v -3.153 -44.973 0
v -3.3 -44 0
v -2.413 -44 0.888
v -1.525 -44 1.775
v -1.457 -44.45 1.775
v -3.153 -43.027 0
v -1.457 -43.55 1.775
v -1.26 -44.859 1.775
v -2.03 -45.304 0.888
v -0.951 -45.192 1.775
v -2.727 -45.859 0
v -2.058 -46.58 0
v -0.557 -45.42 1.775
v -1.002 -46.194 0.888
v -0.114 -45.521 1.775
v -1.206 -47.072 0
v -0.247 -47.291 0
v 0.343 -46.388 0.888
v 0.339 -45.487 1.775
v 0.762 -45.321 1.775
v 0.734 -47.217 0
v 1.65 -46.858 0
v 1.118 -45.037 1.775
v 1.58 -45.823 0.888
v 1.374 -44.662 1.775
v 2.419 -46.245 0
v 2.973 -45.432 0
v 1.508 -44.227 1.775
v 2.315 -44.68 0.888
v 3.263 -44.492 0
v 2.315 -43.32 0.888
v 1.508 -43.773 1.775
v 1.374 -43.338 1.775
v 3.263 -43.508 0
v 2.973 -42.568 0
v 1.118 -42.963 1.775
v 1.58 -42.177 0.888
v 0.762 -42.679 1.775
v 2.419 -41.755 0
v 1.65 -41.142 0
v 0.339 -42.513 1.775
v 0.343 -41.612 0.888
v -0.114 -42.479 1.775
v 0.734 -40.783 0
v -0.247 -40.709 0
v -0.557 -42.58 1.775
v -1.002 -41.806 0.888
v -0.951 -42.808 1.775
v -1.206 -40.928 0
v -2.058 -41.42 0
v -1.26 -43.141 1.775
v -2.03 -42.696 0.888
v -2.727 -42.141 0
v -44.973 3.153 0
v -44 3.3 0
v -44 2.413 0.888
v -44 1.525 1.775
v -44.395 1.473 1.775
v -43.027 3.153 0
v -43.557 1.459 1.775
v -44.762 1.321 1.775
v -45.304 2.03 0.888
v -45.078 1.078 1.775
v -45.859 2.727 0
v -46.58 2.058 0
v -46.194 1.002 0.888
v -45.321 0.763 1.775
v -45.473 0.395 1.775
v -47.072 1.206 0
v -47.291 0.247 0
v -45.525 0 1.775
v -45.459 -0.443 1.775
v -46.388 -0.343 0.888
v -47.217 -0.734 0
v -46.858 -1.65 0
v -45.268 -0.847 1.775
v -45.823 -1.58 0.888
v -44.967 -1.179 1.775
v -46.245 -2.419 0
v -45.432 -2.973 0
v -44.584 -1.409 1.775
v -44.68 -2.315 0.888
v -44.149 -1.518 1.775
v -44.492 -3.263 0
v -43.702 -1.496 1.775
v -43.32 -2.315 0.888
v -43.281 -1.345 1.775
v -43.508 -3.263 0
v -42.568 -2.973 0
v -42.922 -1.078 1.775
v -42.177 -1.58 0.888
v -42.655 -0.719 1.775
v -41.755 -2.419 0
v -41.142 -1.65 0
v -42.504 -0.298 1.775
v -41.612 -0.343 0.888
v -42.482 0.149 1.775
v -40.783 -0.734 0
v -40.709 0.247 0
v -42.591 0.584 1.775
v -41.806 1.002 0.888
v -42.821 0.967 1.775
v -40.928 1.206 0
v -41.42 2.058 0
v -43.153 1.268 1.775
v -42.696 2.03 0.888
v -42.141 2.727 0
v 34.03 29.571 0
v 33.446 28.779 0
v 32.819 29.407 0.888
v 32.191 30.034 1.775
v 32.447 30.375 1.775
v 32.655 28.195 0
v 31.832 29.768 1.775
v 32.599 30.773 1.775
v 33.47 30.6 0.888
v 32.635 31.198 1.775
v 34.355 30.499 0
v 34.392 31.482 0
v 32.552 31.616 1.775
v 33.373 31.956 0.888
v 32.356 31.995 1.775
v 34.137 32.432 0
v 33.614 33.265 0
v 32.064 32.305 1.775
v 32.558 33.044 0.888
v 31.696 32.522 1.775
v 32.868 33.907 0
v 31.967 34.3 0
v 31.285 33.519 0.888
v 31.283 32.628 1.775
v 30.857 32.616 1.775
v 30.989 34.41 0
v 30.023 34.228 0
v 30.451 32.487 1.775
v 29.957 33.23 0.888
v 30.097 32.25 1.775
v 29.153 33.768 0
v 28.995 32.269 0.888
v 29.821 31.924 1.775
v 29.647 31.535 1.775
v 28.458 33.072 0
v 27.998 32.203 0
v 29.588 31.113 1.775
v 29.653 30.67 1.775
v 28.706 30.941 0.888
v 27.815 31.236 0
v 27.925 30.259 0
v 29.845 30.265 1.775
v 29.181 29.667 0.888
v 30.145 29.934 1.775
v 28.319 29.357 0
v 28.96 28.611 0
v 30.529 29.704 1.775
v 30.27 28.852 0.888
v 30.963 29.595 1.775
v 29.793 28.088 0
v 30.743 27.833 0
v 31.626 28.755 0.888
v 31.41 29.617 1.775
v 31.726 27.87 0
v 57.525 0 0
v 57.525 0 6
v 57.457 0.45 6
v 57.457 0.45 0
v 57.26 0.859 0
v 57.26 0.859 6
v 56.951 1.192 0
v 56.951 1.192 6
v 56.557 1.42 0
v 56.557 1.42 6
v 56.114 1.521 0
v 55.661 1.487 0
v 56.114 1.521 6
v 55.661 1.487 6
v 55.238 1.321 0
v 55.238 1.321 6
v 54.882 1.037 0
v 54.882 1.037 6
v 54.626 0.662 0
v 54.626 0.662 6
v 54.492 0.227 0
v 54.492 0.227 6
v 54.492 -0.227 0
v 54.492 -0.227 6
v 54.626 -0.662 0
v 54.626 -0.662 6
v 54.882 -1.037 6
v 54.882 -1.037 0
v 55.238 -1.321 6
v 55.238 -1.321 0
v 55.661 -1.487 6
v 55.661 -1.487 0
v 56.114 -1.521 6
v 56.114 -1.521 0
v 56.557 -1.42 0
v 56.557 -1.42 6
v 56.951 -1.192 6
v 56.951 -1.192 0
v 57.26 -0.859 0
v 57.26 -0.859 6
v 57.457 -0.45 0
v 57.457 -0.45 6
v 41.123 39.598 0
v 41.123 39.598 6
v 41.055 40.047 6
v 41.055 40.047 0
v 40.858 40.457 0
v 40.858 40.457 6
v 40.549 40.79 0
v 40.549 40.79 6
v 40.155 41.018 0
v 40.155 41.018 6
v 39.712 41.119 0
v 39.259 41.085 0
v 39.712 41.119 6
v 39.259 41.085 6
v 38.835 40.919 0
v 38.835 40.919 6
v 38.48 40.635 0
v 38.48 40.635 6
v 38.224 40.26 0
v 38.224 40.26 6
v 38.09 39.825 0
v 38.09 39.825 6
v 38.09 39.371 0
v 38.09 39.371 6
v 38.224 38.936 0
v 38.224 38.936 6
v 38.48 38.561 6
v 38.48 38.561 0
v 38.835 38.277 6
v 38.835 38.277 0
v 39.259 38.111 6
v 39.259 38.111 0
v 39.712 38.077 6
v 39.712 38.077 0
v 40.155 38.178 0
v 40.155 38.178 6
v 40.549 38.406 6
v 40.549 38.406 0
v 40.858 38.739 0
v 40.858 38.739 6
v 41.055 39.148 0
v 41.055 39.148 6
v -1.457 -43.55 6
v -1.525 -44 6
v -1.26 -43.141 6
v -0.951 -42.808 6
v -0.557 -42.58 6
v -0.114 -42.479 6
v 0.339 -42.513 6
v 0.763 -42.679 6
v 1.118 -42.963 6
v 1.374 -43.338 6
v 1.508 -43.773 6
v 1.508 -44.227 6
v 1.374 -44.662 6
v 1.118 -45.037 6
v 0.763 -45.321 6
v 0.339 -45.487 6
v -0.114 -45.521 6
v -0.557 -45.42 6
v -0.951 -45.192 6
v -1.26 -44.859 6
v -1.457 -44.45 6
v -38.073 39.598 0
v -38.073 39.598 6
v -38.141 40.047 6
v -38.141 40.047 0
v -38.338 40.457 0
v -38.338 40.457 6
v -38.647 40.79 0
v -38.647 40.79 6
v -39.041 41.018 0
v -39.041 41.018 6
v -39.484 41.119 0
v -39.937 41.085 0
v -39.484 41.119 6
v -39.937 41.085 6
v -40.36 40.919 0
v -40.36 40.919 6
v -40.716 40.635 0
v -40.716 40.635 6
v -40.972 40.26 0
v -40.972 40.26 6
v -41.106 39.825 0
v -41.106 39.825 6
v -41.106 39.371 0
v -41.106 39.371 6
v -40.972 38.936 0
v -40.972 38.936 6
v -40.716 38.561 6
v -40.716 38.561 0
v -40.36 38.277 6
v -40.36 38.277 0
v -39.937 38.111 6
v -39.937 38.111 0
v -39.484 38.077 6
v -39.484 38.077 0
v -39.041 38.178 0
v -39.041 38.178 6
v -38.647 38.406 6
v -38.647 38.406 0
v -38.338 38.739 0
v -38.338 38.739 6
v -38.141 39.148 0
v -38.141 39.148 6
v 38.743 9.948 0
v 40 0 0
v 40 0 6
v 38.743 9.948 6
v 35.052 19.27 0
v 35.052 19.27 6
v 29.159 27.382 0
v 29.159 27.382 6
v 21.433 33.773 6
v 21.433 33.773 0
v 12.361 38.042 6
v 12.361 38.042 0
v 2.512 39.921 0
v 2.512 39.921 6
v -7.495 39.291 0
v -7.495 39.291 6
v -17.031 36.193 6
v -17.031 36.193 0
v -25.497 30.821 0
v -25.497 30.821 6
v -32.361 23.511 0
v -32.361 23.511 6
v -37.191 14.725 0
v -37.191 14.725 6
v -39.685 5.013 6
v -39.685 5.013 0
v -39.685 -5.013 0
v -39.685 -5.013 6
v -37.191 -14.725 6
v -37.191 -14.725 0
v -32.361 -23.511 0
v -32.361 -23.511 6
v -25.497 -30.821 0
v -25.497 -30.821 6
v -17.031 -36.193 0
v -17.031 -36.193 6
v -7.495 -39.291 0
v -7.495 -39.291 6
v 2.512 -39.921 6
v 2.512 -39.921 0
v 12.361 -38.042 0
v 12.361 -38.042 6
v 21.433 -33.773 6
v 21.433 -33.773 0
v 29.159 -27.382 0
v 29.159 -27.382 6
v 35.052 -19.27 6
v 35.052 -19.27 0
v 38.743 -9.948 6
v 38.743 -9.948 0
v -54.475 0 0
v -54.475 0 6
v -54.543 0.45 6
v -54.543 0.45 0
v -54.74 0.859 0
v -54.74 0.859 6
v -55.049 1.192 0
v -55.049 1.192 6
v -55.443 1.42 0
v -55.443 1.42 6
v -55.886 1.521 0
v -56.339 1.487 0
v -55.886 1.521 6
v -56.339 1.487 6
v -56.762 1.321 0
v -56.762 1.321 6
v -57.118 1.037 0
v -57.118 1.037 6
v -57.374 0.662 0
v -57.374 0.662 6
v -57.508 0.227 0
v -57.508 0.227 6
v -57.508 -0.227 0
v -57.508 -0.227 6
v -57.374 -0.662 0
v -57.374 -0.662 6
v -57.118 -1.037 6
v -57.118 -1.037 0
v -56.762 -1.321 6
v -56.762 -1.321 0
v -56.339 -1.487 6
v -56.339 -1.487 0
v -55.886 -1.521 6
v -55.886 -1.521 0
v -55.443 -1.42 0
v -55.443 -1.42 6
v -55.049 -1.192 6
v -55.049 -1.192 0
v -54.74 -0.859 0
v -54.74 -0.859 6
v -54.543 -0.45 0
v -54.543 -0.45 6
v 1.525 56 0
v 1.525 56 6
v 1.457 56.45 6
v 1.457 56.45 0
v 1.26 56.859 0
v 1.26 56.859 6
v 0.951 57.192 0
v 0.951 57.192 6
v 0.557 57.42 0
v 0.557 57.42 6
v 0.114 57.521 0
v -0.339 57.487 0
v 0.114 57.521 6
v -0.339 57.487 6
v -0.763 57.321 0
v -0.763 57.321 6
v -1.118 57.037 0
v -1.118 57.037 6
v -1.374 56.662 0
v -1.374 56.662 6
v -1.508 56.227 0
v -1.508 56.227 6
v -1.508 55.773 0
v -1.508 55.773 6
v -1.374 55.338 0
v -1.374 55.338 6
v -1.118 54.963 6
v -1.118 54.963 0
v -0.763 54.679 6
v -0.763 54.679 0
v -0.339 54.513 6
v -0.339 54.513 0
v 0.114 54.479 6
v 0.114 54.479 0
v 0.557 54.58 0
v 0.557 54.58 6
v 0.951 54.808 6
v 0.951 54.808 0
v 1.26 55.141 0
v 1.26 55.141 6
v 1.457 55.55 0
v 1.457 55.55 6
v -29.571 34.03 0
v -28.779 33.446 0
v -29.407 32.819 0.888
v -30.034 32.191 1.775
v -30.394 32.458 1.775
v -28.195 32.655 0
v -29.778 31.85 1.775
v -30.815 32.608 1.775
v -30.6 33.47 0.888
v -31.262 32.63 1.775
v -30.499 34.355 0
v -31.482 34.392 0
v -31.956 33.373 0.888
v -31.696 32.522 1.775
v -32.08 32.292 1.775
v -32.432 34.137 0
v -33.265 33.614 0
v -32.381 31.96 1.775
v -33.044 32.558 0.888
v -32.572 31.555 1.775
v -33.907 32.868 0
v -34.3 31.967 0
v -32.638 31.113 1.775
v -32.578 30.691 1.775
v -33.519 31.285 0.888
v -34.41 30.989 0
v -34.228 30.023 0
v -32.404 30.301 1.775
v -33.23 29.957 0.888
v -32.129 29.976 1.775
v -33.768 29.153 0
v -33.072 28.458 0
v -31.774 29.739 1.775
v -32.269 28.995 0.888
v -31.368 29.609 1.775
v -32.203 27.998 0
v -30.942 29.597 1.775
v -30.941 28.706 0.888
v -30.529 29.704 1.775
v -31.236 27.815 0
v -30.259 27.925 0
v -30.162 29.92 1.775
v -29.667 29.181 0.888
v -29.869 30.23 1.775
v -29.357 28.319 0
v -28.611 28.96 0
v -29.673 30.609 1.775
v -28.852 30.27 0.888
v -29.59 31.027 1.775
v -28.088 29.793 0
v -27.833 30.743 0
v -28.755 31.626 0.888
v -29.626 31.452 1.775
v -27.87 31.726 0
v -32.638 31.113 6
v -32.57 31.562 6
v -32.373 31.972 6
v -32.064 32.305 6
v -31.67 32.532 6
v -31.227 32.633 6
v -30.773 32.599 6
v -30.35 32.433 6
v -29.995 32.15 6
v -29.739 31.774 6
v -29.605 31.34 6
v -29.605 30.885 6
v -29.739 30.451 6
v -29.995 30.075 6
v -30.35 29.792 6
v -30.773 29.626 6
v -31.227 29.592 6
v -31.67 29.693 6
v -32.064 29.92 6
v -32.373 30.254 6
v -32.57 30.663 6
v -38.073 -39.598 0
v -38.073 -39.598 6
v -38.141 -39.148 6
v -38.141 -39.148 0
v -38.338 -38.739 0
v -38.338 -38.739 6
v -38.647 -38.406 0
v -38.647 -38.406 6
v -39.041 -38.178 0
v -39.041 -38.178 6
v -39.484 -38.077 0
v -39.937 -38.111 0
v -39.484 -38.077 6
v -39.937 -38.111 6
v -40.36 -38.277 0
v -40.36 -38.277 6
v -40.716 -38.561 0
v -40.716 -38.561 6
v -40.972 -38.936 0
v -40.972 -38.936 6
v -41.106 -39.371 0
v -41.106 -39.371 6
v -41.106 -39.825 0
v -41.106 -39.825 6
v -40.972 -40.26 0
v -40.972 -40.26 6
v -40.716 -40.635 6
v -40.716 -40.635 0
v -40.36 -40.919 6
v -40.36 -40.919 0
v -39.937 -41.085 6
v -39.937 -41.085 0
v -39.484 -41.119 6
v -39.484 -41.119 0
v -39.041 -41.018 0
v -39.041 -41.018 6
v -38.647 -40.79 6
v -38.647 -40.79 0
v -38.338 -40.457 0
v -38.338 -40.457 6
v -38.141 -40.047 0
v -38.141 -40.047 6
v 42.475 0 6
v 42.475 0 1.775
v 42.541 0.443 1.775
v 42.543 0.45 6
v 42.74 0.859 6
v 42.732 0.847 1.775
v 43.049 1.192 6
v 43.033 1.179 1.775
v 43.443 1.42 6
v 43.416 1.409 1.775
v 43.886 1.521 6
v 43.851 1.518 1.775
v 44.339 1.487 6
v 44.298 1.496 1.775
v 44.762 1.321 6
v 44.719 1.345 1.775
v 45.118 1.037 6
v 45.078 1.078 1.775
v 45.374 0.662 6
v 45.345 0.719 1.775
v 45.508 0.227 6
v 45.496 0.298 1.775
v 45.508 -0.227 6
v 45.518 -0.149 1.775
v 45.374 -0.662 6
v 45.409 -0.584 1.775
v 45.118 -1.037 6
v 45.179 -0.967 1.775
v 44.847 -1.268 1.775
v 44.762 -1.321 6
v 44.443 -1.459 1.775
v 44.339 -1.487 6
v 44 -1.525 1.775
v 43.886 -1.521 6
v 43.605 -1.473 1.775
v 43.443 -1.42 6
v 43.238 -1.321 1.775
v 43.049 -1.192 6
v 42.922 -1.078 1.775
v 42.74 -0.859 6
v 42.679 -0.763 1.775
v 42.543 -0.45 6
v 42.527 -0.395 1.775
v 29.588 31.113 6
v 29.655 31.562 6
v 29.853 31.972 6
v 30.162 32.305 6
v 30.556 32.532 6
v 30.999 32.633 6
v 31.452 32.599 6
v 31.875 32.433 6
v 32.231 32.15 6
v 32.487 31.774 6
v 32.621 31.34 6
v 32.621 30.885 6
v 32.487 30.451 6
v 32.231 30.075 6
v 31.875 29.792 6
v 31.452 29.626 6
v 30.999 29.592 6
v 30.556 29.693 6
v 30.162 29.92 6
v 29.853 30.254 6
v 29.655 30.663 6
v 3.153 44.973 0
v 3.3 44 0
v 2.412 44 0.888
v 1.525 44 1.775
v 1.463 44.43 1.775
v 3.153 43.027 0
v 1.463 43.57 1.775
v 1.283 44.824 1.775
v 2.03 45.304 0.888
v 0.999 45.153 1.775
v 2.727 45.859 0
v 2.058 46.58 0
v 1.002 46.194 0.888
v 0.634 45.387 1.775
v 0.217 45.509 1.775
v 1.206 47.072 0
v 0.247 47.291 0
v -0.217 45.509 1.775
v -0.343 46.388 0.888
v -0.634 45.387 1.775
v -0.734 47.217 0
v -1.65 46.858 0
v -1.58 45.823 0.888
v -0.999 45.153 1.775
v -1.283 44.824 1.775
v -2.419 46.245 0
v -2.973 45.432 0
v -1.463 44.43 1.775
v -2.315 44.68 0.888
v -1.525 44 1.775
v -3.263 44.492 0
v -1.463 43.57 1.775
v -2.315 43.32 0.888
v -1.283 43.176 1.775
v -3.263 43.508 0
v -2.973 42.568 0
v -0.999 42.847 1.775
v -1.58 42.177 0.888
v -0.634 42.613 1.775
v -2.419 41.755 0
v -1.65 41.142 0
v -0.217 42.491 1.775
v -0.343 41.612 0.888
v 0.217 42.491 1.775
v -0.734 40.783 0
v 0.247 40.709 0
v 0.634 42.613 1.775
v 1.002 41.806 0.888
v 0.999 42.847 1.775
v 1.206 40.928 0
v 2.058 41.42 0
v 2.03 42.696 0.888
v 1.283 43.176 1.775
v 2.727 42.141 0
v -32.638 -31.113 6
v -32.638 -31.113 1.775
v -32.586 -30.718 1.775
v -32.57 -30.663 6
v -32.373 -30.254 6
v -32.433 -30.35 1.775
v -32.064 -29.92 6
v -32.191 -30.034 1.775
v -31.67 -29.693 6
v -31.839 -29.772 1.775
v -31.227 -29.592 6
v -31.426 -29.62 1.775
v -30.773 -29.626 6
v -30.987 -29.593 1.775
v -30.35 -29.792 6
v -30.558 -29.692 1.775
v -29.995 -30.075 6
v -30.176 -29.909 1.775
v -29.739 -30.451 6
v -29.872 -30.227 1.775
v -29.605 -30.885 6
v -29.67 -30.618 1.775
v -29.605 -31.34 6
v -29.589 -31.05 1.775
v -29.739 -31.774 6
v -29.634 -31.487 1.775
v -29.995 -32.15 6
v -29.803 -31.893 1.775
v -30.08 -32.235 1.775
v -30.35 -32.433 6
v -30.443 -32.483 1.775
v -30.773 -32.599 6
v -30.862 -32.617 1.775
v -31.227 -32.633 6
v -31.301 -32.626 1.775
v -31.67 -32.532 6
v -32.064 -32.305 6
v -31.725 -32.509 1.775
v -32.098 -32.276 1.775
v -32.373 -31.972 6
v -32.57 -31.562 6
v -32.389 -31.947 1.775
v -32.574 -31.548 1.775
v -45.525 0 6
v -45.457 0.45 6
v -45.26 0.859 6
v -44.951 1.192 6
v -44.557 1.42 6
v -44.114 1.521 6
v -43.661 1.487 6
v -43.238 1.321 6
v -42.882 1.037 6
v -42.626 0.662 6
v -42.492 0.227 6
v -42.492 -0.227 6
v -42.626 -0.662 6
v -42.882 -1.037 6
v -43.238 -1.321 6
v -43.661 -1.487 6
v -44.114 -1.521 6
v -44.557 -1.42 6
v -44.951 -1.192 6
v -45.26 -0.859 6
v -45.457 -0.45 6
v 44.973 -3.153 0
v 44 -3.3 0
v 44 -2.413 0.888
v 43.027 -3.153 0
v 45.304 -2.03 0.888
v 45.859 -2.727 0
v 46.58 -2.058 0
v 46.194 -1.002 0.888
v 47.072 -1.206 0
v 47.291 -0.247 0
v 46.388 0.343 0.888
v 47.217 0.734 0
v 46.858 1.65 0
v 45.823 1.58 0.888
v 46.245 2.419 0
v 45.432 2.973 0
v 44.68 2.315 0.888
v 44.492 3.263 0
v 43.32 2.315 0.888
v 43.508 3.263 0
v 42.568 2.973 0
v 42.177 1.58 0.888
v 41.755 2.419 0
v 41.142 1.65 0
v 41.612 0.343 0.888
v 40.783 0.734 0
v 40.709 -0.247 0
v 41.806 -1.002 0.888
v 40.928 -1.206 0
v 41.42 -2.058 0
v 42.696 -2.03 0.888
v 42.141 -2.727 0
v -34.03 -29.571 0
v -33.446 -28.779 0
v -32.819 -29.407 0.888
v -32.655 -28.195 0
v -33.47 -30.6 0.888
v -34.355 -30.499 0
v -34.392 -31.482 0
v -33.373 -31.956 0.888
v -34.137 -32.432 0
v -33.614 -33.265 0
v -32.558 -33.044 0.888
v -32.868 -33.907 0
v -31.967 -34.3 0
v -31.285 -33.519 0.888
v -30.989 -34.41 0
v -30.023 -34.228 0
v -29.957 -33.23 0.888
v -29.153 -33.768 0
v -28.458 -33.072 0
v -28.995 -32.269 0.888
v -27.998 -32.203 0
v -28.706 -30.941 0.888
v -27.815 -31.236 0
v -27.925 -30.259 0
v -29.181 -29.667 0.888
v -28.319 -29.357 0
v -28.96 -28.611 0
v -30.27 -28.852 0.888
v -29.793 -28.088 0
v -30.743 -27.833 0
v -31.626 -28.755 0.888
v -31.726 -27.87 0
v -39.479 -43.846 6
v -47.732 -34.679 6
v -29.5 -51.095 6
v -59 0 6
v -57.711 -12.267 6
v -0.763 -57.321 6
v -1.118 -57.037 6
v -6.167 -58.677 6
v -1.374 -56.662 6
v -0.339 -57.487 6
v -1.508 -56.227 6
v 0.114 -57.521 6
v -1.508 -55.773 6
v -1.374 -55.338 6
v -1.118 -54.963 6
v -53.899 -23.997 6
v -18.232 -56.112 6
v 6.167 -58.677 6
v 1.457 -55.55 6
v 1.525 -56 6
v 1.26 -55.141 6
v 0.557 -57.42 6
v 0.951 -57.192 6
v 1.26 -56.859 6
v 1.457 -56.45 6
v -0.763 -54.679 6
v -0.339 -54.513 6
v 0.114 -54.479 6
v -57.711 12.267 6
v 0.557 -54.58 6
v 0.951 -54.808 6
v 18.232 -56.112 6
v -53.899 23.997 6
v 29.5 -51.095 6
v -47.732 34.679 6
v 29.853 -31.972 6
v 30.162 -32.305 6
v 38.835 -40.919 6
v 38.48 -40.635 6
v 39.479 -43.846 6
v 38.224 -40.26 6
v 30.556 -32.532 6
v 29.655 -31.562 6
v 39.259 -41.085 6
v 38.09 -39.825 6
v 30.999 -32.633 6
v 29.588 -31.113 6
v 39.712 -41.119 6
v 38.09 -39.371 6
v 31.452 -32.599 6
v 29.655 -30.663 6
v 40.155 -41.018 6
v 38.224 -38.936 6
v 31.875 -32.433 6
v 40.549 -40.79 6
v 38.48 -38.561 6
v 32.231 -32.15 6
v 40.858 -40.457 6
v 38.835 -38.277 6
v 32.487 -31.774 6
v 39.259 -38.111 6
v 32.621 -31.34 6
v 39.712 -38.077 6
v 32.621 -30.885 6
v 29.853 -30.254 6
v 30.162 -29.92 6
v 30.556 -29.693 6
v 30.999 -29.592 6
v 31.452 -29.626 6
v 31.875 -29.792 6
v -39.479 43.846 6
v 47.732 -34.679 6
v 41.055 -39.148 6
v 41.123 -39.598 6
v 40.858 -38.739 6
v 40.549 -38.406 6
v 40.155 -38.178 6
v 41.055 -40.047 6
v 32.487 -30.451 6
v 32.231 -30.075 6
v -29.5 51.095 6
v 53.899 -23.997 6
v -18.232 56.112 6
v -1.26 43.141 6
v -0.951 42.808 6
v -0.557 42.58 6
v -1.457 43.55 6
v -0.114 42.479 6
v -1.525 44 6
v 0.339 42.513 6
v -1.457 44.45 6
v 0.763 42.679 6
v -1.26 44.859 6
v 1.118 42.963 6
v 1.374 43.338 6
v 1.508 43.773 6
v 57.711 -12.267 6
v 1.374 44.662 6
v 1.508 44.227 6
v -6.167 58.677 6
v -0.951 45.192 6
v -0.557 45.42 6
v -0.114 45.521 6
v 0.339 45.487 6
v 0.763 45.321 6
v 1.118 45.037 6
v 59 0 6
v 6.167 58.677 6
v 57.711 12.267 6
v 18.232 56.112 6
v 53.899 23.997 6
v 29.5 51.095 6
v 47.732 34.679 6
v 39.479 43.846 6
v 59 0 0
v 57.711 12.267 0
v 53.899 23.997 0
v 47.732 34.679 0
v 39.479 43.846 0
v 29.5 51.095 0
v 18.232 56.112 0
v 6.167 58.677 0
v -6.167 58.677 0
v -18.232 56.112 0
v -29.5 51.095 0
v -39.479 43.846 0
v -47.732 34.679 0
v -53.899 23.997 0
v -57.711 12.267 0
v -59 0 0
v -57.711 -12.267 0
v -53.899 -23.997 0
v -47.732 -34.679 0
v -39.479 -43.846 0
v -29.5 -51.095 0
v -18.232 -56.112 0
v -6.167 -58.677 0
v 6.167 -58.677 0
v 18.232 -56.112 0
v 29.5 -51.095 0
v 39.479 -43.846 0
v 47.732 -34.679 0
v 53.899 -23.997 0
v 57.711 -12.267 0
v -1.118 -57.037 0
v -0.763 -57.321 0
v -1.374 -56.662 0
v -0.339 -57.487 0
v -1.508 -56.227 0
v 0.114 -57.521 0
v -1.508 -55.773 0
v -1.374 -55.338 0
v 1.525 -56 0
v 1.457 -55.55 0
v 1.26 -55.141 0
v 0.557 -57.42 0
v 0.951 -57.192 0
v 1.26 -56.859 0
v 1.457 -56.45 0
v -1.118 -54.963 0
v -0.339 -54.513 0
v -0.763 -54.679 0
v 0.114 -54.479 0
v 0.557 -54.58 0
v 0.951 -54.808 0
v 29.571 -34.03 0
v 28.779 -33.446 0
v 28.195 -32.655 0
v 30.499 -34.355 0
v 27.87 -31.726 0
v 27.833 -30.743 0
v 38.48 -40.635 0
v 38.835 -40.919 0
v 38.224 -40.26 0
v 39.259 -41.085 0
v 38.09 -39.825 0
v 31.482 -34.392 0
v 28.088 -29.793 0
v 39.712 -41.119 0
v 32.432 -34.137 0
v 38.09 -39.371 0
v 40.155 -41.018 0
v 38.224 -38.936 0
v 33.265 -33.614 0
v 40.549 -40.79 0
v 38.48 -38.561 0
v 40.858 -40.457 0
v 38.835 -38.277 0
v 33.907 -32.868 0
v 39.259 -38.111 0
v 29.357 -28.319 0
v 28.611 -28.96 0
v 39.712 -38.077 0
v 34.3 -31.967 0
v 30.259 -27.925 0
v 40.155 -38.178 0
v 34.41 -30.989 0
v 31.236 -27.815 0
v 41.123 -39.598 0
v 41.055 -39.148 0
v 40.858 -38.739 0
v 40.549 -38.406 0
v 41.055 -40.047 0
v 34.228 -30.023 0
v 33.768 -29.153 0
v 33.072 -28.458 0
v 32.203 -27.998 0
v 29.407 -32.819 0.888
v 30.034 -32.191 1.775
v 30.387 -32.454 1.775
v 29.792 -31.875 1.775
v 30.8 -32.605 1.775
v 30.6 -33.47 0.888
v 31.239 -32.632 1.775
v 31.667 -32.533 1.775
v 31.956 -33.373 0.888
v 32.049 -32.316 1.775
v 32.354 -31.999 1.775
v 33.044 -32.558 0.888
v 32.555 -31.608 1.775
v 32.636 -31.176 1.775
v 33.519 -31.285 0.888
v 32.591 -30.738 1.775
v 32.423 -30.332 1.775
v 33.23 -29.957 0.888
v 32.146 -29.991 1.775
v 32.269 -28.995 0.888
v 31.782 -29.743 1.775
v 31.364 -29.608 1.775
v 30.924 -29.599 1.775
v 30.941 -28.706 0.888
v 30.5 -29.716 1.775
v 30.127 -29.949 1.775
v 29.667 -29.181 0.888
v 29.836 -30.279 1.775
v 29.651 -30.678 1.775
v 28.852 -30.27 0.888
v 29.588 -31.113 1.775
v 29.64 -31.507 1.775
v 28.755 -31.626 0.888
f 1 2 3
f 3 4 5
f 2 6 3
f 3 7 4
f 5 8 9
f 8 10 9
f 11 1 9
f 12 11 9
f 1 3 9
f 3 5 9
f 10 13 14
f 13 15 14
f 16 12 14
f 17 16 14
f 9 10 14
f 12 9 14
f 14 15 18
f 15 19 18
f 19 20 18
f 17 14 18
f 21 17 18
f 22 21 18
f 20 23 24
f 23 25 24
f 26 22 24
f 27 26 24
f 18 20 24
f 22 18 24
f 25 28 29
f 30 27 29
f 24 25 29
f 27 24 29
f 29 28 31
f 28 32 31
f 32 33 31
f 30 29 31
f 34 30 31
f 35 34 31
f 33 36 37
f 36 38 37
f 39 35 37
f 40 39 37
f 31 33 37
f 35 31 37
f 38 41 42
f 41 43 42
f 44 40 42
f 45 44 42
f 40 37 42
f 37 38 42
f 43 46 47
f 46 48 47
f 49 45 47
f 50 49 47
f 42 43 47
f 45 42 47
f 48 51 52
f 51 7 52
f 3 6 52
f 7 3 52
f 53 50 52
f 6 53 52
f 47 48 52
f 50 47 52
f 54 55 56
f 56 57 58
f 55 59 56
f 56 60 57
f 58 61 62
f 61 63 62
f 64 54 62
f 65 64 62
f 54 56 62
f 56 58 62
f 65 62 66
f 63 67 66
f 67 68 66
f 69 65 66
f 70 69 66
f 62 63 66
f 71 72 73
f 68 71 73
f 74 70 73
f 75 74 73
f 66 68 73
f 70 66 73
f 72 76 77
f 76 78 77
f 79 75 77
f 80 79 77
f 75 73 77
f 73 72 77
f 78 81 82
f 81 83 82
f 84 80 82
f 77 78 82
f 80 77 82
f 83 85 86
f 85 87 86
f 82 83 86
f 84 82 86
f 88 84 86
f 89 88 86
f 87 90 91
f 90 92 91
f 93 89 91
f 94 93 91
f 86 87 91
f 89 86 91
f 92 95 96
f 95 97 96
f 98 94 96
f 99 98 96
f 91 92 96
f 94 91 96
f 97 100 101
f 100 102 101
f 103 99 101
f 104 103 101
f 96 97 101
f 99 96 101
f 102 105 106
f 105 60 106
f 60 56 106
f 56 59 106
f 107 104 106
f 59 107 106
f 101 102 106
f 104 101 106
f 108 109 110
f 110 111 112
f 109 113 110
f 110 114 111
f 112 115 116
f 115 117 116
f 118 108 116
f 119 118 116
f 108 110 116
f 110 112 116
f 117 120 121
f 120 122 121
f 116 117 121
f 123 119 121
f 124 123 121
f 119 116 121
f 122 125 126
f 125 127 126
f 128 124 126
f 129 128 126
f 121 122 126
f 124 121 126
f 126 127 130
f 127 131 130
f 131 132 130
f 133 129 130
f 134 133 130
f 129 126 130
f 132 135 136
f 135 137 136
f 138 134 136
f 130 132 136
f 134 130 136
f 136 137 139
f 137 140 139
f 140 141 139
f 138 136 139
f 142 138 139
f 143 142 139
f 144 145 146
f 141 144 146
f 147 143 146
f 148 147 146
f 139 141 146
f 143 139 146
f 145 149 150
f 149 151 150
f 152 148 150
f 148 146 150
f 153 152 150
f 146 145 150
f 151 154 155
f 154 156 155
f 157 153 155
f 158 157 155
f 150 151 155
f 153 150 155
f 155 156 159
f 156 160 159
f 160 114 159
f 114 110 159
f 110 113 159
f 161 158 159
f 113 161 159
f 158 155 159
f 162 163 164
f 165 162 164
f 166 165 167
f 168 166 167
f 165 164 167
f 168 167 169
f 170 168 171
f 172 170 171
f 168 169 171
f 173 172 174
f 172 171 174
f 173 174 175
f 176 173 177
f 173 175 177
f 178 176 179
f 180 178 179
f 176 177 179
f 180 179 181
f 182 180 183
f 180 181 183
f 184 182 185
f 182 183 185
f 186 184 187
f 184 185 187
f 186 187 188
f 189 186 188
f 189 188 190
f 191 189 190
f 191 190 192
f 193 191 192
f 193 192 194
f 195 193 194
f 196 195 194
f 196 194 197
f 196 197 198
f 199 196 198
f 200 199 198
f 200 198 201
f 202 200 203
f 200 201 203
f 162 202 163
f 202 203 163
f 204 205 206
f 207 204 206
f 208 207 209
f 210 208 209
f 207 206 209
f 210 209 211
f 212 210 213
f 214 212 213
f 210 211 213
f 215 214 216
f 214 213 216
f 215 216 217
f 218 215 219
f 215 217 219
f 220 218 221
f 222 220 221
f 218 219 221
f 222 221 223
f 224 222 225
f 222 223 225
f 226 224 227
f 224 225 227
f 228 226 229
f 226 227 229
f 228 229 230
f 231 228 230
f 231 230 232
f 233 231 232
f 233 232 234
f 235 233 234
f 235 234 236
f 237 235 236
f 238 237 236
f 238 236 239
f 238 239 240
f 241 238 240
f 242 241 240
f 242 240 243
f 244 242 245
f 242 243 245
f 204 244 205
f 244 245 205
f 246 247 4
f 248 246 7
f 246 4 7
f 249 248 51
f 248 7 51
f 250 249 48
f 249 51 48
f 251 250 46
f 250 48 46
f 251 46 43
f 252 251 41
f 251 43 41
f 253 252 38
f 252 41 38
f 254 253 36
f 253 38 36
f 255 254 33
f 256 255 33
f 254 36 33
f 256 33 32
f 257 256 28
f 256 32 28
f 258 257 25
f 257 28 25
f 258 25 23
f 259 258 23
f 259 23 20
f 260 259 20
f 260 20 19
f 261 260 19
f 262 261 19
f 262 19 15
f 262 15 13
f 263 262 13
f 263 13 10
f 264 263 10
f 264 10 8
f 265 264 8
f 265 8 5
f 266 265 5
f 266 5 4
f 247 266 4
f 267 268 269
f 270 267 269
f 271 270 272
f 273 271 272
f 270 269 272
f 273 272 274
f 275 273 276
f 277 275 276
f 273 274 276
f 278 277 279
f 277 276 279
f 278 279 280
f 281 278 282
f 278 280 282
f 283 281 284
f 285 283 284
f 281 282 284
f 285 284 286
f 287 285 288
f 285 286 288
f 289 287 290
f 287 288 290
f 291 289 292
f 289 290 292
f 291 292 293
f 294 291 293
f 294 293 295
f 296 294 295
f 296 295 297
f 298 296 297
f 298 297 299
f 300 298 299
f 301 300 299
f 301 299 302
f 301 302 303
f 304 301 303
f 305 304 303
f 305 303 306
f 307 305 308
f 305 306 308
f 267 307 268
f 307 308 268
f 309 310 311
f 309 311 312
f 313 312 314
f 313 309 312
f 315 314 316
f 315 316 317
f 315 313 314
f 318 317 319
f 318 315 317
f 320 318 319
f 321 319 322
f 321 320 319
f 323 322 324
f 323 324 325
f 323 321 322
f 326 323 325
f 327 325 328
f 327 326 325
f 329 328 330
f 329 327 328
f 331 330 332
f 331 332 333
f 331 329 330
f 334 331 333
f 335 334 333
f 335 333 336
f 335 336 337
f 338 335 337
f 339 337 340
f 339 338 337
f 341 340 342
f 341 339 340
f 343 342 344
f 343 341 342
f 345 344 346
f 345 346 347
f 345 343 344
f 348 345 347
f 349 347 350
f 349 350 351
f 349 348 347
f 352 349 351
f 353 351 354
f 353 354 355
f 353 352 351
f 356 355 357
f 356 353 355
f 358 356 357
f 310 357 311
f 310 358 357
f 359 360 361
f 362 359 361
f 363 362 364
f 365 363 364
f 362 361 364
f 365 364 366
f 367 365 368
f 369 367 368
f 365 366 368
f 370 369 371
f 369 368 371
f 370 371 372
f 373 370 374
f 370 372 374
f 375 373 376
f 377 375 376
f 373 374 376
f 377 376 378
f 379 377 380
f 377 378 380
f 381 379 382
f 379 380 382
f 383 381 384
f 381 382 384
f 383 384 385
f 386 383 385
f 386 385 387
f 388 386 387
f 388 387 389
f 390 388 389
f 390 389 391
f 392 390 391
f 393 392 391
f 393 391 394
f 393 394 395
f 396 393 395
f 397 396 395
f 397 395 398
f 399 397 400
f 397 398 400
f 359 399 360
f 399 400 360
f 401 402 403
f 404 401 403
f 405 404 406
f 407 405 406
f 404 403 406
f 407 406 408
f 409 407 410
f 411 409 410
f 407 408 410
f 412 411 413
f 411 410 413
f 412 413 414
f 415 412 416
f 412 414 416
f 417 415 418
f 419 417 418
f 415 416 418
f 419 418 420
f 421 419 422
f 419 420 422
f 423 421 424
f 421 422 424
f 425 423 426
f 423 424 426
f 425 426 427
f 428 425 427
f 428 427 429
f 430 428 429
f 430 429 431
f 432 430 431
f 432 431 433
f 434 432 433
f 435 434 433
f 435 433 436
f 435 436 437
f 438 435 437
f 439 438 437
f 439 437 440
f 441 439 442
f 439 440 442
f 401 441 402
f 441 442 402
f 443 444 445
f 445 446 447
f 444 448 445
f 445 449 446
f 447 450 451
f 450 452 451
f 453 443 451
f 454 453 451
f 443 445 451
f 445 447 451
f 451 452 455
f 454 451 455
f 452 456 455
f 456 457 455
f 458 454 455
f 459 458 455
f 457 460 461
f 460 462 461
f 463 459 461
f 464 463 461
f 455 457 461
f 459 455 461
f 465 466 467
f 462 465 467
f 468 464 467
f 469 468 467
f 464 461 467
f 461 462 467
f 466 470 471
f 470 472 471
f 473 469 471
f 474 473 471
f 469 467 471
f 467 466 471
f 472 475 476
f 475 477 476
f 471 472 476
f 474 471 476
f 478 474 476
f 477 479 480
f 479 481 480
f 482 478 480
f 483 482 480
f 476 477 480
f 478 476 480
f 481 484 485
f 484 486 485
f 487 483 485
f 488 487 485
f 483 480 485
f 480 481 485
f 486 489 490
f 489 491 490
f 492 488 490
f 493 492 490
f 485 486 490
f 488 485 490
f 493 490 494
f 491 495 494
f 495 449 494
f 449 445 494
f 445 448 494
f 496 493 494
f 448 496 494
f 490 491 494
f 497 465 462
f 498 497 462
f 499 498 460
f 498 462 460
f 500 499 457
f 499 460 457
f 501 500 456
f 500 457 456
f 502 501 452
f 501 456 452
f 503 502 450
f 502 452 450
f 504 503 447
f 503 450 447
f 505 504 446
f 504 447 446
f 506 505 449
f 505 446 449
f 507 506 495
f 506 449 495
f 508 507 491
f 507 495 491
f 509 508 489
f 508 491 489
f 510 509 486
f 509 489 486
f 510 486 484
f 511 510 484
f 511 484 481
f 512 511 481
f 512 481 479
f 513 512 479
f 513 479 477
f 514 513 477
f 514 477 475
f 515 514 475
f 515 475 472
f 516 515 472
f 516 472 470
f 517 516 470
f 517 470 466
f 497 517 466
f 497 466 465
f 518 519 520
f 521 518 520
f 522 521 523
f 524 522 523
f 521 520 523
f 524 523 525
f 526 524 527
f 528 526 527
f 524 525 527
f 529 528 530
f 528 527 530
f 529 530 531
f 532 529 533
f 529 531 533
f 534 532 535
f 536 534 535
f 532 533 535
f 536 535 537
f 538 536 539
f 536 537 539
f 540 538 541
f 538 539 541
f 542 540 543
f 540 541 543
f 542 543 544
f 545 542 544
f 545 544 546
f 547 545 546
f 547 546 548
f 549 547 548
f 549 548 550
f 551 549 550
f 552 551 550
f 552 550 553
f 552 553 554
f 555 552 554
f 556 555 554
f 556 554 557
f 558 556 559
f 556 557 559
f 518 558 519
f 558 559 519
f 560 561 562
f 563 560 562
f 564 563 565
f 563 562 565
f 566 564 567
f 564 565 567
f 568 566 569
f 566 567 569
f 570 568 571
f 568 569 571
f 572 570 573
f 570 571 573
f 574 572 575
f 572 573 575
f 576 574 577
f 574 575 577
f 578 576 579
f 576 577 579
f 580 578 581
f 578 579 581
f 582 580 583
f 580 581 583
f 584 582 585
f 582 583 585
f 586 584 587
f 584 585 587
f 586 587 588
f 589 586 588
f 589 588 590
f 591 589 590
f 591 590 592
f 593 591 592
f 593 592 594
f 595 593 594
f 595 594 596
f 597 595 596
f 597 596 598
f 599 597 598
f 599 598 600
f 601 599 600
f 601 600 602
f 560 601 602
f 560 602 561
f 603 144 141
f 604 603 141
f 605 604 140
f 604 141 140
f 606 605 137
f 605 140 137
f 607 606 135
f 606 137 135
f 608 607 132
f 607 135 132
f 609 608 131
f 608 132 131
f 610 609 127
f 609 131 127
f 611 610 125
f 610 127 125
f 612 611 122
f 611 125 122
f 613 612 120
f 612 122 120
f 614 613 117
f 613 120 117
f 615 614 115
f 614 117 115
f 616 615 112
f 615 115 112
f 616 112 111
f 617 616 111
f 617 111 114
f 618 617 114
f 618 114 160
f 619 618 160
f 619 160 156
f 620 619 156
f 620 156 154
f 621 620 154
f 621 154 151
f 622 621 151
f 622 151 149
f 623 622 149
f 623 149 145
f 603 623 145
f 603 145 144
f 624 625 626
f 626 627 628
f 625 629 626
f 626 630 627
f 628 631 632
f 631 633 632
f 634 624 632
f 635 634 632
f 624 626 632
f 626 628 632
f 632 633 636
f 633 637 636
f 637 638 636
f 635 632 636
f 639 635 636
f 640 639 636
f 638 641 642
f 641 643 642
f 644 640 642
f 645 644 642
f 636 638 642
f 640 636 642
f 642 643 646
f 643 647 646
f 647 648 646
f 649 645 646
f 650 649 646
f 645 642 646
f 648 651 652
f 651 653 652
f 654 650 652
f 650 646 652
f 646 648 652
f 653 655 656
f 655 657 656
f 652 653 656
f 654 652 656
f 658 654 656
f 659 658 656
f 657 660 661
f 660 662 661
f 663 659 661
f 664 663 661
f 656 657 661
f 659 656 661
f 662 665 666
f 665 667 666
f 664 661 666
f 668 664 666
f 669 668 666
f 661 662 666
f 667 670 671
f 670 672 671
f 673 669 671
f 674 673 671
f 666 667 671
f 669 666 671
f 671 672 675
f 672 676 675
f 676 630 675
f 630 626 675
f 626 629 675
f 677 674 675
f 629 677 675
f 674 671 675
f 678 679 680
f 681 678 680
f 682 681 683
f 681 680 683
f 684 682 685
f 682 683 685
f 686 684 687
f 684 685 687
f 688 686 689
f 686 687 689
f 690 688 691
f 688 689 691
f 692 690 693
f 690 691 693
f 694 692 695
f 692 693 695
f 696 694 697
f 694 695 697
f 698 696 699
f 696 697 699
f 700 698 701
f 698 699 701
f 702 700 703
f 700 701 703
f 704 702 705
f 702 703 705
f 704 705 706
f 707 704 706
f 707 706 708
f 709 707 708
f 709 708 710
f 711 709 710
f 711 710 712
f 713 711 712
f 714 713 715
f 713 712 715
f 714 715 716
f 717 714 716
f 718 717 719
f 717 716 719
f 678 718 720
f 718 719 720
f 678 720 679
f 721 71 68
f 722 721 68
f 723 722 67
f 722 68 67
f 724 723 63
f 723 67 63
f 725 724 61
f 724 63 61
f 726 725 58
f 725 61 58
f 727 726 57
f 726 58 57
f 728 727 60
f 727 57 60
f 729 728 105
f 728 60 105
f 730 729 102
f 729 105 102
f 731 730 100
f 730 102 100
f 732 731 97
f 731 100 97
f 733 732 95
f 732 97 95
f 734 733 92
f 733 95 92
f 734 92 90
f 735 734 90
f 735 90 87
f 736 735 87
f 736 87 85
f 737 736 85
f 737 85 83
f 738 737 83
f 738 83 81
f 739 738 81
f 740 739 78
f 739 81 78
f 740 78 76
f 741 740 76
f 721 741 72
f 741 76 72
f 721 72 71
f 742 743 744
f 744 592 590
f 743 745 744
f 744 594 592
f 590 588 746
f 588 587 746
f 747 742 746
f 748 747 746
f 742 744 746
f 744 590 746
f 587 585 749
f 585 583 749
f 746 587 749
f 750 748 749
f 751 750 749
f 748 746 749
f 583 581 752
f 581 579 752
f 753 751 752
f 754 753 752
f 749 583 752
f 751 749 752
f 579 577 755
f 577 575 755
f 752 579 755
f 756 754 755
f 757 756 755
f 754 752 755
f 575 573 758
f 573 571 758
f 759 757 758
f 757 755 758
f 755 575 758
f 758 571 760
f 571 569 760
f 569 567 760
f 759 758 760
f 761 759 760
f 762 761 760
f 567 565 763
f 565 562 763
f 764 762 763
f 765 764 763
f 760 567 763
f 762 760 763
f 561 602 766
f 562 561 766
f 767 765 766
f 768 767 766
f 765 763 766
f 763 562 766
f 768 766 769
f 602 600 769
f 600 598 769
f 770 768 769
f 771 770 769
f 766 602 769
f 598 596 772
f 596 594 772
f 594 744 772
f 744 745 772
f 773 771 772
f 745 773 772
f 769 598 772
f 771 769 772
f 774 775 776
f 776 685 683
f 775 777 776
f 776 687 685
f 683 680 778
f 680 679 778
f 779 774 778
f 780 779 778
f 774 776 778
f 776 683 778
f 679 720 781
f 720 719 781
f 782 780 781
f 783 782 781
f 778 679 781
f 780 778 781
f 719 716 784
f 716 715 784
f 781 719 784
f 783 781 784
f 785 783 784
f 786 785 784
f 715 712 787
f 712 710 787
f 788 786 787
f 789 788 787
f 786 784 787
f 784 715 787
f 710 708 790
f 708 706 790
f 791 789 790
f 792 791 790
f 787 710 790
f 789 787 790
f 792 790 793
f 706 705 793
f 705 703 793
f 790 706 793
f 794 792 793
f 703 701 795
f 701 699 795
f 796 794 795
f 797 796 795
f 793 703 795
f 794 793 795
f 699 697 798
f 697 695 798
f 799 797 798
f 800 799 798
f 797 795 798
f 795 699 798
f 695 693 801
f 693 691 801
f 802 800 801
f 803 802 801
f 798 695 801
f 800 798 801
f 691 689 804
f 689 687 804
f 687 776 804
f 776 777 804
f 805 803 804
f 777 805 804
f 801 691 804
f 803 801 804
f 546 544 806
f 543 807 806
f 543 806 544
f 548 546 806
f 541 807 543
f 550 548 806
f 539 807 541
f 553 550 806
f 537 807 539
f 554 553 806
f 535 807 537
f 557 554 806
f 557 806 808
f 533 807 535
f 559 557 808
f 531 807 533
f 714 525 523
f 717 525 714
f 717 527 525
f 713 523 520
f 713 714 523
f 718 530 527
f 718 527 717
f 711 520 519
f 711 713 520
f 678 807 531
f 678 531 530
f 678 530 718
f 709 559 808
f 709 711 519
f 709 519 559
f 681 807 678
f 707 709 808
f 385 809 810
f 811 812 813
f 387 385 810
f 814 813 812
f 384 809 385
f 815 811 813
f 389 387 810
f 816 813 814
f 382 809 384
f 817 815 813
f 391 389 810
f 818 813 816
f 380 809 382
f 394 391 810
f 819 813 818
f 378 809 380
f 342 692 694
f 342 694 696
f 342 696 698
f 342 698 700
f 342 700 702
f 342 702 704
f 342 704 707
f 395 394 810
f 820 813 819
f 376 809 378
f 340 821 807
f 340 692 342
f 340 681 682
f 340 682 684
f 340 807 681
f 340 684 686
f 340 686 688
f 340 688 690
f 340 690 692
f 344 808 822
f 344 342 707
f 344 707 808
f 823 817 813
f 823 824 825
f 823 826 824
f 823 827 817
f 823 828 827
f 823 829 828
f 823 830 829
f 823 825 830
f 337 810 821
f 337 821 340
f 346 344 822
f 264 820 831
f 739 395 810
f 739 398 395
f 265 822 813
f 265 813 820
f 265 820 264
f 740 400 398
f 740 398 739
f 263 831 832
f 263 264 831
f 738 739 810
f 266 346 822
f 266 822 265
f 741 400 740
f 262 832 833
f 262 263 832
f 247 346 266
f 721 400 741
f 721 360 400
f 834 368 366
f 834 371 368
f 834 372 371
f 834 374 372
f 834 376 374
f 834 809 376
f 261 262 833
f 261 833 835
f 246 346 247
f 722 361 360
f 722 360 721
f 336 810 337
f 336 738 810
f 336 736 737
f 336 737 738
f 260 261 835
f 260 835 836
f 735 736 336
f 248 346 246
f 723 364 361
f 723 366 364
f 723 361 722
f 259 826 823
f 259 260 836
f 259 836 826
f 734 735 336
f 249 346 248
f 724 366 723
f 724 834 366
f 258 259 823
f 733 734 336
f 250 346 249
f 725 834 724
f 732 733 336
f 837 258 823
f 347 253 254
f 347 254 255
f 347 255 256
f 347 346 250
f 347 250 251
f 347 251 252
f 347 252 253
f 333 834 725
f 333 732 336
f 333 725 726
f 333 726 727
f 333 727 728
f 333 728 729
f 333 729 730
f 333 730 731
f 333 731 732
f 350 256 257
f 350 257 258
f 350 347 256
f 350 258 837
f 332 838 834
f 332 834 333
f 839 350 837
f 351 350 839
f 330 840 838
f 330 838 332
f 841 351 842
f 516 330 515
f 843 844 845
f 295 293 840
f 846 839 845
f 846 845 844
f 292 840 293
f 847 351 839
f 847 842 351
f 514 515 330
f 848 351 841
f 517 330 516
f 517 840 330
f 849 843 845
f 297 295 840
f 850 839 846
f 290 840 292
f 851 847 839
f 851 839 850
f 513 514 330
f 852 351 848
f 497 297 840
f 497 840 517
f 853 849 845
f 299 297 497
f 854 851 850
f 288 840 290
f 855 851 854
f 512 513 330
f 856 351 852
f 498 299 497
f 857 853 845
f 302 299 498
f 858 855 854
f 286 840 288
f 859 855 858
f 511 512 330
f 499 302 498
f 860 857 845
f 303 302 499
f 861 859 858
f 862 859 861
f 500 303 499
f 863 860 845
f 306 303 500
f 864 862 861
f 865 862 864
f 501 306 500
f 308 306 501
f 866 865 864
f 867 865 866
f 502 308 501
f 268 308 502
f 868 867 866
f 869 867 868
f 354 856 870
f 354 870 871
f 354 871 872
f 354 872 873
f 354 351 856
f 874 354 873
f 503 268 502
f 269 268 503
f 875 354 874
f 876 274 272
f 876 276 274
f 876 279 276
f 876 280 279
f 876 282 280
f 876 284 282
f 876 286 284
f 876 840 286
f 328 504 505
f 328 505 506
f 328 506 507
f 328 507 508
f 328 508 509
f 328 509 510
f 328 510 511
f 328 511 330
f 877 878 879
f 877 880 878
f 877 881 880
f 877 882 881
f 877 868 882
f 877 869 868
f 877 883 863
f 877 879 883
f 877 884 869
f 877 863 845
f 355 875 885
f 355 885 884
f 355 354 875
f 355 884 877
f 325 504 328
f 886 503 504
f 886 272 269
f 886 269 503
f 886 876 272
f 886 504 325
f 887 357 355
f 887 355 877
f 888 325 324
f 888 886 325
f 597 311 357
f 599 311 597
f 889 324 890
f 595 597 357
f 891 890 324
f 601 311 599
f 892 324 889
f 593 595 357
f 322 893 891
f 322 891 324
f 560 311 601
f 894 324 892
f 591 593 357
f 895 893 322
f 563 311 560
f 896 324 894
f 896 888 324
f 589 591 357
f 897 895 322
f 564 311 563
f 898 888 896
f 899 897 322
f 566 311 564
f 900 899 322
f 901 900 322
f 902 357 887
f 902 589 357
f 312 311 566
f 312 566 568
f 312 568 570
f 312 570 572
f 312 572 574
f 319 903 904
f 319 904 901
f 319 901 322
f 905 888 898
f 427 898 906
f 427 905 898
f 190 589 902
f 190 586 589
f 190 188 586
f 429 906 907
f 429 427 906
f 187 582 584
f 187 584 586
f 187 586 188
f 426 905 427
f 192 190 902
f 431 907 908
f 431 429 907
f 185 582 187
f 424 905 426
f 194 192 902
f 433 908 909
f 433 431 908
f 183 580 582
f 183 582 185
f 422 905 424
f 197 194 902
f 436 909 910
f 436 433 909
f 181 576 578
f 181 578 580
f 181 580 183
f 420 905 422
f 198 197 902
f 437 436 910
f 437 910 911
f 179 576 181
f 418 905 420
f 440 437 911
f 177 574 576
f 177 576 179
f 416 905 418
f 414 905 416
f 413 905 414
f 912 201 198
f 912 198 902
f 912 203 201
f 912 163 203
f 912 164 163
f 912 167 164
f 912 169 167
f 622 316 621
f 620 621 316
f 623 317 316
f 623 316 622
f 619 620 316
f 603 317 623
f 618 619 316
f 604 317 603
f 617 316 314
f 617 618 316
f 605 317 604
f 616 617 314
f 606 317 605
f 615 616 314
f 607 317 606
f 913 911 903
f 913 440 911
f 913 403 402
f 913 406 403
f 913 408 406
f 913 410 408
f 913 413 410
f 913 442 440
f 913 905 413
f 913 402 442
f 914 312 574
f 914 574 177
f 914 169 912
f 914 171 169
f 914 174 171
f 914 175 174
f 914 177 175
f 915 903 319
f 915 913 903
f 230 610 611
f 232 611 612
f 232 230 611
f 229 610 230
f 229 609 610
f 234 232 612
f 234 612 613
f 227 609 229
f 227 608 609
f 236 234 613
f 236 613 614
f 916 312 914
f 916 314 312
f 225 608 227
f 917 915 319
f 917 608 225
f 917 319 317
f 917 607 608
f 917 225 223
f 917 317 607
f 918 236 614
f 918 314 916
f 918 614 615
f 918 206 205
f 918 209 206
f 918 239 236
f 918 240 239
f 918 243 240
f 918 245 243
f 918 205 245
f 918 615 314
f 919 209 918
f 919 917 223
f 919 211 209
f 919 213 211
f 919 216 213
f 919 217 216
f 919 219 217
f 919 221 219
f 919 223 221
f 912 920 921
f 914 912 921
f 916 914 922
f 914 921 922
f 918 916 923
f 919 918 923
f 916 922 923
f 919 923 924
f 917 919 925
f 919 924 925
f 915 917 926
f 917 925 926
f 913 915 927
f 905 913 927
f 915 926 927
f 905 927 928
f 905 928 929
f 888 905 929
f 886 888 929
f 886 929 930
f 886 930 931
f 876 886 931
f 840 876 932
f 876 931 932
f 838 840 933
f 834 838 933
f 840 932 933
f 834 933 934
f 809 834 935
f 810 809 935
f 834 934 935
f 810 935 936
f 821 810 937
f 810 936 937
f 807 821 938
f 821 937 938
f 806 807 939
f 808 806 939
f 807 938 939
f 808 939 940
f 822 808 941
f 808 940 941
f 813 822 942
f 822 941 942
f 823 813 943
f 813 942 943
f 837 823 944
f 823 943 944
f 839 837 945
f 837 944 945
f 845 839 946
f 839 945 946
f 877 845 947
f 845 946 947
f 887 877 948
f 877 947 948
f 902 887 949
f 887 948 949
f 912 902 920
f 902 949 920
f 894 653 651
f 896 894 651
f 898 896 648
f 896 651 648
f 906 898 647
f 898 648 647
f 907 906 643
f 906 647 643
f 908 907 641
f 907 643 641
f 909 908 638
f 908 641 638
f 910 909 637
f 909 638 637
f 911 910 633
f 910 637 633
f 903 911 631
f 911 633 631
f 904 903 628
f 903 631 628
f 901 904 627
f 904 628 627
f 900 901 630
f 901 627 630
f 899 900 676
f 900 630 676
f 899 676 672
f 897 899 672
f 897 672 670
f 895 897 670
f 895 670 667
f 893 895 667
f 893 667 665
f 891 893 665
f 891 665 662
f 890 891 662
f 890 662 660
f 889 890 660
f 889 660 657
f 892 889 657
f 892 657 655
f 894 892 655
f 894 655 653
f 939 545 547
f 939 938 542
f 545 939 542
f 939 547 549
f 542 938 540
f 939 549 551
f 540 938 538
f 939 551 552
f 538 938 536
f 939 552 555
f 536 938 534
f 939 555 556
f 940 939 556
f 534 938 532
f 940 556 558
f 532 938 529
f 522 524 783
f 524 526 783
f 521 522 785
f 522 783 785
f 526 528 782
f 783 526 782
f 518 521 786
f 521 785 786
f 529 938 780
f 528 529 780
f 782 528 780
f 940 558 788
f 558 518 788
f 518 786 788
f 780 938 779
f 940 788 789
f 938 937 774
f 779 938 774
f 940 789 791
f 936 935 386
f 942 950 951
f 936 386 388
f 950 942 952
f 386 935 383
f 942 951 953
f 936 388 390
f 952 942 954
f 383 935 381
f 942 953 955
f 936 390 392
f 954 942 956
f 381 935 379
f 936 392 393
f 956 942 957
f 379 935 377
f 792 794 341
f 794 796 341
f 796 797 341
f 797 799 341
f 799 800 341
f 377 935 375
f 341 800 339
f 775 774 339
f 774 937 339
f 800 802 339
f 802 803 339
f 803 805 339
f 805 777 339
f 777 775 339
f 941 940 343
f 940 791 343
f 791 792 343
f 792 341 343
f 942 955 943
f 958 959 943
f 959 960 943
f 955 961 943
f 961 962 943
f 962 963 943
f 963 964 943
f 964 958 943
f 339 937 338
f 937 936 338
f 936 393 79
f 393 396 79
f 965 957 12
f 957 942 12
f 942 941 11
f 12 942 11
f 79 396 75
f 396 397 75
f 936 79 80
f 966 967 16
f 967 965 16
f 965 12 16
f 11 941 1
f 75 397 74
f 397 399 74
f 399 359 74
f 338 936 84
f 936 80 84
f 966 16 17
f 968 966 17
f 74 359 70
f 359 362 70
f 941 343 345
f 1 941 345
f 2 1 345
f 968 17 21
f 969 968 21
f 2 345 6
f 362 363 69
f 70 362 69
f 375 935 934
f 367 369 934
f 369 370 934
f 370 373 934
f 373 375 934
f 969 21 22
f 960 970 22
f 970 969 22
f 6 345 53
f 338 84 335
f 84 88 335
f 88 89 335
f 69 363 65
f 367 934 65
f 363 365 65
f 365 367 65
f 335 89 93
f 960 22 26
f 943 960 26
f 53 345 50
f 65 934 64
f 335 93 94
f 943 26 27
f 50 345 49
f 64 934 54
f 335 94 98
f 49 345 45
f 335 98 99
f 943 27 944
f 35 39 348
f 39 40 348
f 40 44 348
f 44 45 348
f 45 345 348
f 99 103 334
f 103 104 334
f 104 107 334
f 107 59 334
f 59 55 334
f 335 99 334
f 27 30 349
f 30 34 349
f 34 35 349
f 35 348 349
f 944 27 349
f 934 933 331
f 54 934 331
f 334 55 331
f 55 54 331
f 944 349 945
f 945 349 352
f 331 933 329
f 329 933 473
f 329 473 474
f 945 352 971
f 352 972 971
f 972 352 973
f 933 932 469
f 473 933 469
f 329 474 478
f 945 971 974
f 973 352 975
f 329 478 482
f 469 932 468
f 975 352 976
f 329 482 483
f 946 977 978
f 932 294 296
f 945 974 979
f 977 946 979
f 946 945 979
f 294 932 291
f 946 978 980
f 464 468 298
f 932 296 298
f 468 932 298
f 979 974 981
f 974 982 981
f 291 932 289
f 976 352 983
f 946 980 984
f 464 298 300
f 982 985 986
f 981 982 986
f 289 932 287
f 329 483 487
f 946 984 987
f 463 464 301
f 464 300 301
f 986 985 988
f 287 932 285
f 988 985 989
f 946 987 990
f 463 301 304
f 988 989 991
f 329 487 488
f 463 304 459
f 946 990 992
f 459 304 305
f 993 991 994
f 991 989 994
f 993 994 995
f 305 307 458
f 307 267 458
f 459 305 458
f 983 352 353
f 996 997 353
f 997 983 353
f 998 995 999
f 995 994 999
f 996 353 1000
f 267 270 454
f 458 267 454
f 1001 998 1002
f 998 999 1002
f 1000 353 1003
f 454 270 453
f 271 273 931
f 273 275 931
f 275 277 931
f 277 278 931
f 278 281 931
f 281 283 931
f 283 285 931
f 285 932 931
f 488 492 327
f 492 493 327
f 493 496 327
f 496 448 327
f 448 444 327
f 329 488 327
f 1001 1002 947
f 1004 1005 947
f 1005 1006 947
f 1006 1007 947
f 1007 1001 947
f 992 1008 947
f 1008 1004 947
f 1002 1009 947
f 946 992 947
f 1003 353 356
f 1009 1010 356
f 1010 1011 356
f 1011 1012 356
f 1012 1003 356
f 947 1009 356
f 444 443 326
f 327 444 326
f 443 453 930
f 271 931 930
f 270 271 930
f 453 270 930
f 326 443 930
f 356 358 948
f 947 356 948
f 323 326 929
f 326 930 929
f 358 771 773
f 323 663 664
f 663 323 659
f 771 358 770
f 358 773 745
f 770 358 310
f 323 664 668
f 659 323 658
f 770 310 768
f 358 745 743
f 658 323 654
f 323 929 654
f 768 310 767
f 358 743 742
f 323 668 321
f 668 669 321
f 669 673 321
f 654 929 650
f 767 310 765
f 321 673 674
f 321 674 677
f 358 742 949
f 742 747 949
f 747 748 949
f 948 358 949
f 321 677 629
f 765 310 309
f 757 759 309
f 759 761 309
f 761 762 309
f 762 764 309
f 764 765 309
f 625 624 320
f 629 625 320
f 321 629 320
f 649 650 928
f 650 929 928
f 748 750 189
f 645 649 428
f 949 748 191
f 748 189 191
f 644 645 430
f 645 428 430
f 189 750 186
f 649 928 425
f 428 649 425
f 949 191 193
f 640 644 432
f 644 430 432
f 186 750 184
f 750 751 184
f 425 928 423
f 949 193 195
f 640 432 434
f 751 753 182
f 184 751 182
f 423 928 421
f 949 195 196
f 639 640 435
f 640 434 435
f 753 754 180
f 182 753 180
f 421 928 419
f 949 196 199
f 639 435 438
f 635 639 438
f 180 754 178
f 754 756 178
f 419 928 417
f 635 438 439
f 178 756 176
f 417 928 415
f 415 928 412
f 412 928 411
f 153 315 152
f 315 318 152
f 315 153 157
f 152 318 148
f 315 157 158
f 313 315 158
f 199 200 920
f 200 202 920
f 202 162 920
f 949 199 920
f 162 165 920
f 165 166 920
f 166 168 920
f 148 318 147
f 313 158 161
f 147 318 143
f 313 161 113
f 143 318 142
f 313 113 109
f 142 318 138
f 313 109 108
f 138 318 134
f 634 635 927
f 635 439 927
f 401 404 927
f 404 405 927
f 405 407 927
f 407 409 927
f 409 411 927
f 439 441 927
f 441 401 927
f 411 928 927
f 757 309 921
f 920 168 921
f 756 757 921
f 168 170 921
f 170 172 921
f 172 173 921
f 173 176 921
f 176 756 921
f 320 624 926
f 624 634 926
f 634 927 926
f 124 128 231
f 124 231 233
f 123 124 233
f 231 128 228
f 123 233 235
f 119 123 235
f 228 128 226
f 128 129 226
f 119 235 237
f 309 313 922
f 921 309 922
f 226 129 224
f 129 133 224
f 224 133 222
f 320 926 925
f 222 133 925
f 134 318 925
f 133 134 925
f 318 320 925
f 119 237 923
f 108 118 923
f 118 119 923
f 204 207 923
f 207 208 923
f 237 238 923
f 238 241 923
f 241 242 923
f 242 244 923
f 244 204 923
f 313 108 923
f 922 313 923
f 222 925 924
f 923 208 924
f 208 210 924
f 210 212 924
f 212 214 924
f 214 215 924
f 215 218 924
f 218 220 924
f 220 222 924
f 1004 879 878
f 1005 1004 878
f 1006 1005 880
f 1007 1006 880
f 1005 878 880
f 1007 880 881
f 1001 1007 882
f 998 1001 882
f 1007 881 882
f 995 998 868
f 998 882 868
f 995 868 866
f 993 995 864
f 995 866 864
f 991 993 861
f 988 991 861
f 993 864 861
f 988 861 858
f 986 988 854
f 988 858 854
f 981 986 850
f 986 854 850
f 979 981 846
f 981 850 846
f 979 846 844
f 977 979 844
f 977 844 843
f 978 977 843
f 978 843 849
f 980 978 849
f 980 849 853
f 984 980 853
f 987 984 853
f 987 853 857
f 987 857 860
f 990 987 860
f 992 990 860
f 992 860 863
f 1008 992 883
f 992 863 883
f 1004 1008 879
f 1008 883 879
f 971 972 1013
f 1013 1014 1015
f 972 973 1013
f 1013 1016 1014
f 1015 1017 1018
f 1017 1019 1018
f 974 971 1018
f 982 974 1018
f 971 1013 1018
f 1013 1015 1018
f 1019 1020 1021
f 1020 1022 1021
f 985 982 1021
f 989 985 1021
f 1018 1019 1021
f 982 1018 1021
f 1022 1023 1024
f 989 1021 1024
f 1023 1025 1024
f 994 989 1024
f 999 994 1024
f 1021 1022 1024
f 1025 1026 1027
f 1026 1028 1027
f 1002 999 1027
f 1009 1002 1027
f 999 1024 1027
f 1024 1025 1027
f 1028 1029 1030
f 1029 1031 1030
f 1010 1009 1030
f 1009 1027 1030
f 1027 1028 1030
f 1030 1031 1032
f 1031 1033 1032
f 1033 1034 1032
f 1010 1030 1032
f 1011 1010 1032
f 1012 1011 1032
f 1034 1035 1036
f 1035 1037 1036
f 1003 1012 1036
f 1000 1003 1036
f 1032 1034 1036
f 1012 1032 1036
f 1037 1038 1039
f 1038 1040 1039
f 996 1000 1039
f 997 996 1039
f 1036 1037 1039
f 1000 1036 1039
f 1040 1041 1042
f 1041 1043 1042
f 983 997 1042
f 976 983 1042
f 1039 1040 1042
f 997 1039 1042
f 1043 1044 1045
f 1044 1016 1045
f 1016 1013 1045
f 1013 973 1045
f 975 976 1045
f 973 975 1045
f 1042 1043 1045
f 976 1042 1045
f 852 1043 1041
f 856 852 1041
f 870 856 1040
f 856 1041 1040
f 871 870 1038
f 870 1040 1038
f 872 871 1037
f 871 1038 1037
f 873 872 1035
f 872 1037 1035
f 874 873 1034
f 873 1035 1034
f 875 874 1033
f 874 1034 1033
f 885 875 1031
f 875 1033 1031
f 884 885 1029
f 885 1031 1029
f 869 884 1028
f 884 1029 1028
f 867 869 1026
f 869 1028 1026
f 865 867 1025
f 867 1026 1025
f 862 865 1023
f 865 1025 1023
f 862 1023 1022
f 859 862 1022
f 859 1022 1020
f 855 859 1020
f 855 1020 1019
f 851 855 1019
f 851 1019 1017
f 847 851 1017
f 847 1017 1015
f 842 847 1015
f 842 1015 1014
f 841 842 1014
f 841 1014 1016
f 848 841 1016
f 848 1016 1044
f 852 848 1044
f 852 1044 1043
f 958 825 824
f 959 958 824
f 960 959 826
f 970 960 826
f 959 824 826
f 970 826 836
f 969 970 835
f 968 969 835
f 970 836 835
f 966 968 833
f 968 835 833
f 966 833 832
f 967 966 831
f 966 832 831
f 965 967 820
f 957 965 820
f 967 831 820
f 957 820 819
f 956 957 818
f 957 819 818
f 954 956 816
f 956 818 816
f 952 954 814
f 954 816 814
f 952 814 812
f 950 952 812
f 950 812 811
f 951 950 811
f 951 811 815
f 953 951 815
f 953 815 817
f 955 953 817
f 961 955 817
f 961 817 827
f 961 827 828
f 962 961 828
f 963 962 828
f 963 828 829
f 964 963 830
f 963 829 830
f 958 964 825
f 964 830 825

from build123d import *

# Parameters (mm, degrees)
SKETCH_1_R                   = 59
SKETCH_1_R_2                 = 50.5
EXTRUDE_1_DEPTH              = 6
SKETCH_2_R                   = 1.525
CUT_EXTRUDE_1_DEPTH          = 6
EXTRUDE_START                = -6
SKETCH_6_R                   = 50.5
SKETCH_6_R_2                 = 40
EXTRUDE_2_DEPTH              = 6
SKETCH_7_R                   = 1.525
CUT_EXTRUDE_3_DEPTH          = 6
HOLE_WIZARD_M3_2_D           = 3.05
HOLE_WIZARD_M3_2_CSINK_D     = 6.6
HOLE_WIZARD_M3_2_CSINK_ANGLE = 90
PATTERN_CIRCULAR_2_COUNT     = 8


with BuildPart() as part:
    # 草图1 → 凸台-拉伸1 (new body)
    with BuildSketch(Plane.XY):
        Circle(SKETCH_1_R)
        Circle(SKETCH_1_R_2, mode=Mode.SUBTRACT)
    extrude(amount=EXTRUDE_1_DEPTH)

    # 草图2 → 切除-拉伸1 (cut)
    with BuildSketch(Plane.XY.offset(6)):
        with Locations((0, 56)):
            Circle(SKETCH_2_R)
        with Locations((39.597979746, 39.597979746)):
            Circle(SKETCH_2_R)
        with Locations((56, 0)):
            Circle(SKETCH_2_R)
        with Locations((39.597979746, -39.597979746)):
            Circle(SKETCH_2_R)
        with Locations((0, -56)):
            Circle(SKETCH_2_R)
        with Locations((-39.597979746, -39.597979746)):
            Circle(SKETCH_2_R)
        with Locations((-56, 0)):
            Circle(SKETCH_2_R)
        with Locations((-39.597979746, 39.597979746)):
            Circle(SKETCH_2_R)
    extrude(amount=-CUT_EXTRUDE_1_DEPTH, mode=Mode.SUBTRACT)

    # 草图6 → 凸台-拉伸2 (add)
    with BuildSketch(Plane.XY.offset(6).offset(EXTRUDE_START)):
        Circle(SKETCH_6_R)
        Circle(SKETCH_6_R_2, mode=Mode.SUBTRACT)
    extrude(amount=EXTRUDE_2_DEPTH)

    # 草图7 → 切除-拉伸3 (cut)
    with BuildSketch(Plane(origin=(0, 0, 0), x_dir=(-1, 0, 0), z_dir=(0, 0, -1))):
        with Locations((0, 44)):
            Circle(SKETCH_7_R)
        with Locations((31.112698372, 31.112698372)):
            Circle(SKETCH_7_R)
        with Locations((44, 0)):
            Circle(SKETCH_7_R)
        with Locations((31.112698372, -31.112698372)):
            Circle(SKETCH_7_R)
        with Locations((0, -44)):
            Circle(SKETCH_7_R)
        with Locations((-31.112698372, -31.112698372)):
            Circle(SKETCH_7_R)
        with Locations((-44, 0)):
            Circle(SKETCH_7_R)
        with Locations((-31.112698372, 31.112698372)):
            Circle(SKETCH_7_R)
    extrude(amount=-CUT_EXTRUDE_3_DEPTH, mode=Mode.SUBTRACT)

    # M3 十字槽沉头木螺钉的锥形沉头孔2 (through all)
    with Locations(Plane(origin=(0, 0, 0), x_dir=(-1, 0, 0), z_dir=(0, 0, -1))):
        with Locations((0, 44)):
            hole_wizard_m3_2 = CounterSinkHole(HOLE_WIZARD_M3_2_D / 2, HOLE_WIZARD_M3_2_CSINK_D / 2, counter_sink_angle=HOLE_WIZARD_M3_2_CSINK_ANGLE)

    # 阵列(圆周)2: M3 十字槽沉头木螺钉的锥形沉头孔2 ×8 about axis
    pattern_circular_2_axis = Axis((0, 0, 0), (0, 0, 1))
    for i in range(1, PATTERN_CIRCULAR_2_COUNT):
        add(hole_wizard_m3_2.rotate(pattern_circular_2_axis, i * 360 / PATTERN_CIRCULAR_2_COUNT), mode=Mode.SUBTRACT)


solid = part.part
